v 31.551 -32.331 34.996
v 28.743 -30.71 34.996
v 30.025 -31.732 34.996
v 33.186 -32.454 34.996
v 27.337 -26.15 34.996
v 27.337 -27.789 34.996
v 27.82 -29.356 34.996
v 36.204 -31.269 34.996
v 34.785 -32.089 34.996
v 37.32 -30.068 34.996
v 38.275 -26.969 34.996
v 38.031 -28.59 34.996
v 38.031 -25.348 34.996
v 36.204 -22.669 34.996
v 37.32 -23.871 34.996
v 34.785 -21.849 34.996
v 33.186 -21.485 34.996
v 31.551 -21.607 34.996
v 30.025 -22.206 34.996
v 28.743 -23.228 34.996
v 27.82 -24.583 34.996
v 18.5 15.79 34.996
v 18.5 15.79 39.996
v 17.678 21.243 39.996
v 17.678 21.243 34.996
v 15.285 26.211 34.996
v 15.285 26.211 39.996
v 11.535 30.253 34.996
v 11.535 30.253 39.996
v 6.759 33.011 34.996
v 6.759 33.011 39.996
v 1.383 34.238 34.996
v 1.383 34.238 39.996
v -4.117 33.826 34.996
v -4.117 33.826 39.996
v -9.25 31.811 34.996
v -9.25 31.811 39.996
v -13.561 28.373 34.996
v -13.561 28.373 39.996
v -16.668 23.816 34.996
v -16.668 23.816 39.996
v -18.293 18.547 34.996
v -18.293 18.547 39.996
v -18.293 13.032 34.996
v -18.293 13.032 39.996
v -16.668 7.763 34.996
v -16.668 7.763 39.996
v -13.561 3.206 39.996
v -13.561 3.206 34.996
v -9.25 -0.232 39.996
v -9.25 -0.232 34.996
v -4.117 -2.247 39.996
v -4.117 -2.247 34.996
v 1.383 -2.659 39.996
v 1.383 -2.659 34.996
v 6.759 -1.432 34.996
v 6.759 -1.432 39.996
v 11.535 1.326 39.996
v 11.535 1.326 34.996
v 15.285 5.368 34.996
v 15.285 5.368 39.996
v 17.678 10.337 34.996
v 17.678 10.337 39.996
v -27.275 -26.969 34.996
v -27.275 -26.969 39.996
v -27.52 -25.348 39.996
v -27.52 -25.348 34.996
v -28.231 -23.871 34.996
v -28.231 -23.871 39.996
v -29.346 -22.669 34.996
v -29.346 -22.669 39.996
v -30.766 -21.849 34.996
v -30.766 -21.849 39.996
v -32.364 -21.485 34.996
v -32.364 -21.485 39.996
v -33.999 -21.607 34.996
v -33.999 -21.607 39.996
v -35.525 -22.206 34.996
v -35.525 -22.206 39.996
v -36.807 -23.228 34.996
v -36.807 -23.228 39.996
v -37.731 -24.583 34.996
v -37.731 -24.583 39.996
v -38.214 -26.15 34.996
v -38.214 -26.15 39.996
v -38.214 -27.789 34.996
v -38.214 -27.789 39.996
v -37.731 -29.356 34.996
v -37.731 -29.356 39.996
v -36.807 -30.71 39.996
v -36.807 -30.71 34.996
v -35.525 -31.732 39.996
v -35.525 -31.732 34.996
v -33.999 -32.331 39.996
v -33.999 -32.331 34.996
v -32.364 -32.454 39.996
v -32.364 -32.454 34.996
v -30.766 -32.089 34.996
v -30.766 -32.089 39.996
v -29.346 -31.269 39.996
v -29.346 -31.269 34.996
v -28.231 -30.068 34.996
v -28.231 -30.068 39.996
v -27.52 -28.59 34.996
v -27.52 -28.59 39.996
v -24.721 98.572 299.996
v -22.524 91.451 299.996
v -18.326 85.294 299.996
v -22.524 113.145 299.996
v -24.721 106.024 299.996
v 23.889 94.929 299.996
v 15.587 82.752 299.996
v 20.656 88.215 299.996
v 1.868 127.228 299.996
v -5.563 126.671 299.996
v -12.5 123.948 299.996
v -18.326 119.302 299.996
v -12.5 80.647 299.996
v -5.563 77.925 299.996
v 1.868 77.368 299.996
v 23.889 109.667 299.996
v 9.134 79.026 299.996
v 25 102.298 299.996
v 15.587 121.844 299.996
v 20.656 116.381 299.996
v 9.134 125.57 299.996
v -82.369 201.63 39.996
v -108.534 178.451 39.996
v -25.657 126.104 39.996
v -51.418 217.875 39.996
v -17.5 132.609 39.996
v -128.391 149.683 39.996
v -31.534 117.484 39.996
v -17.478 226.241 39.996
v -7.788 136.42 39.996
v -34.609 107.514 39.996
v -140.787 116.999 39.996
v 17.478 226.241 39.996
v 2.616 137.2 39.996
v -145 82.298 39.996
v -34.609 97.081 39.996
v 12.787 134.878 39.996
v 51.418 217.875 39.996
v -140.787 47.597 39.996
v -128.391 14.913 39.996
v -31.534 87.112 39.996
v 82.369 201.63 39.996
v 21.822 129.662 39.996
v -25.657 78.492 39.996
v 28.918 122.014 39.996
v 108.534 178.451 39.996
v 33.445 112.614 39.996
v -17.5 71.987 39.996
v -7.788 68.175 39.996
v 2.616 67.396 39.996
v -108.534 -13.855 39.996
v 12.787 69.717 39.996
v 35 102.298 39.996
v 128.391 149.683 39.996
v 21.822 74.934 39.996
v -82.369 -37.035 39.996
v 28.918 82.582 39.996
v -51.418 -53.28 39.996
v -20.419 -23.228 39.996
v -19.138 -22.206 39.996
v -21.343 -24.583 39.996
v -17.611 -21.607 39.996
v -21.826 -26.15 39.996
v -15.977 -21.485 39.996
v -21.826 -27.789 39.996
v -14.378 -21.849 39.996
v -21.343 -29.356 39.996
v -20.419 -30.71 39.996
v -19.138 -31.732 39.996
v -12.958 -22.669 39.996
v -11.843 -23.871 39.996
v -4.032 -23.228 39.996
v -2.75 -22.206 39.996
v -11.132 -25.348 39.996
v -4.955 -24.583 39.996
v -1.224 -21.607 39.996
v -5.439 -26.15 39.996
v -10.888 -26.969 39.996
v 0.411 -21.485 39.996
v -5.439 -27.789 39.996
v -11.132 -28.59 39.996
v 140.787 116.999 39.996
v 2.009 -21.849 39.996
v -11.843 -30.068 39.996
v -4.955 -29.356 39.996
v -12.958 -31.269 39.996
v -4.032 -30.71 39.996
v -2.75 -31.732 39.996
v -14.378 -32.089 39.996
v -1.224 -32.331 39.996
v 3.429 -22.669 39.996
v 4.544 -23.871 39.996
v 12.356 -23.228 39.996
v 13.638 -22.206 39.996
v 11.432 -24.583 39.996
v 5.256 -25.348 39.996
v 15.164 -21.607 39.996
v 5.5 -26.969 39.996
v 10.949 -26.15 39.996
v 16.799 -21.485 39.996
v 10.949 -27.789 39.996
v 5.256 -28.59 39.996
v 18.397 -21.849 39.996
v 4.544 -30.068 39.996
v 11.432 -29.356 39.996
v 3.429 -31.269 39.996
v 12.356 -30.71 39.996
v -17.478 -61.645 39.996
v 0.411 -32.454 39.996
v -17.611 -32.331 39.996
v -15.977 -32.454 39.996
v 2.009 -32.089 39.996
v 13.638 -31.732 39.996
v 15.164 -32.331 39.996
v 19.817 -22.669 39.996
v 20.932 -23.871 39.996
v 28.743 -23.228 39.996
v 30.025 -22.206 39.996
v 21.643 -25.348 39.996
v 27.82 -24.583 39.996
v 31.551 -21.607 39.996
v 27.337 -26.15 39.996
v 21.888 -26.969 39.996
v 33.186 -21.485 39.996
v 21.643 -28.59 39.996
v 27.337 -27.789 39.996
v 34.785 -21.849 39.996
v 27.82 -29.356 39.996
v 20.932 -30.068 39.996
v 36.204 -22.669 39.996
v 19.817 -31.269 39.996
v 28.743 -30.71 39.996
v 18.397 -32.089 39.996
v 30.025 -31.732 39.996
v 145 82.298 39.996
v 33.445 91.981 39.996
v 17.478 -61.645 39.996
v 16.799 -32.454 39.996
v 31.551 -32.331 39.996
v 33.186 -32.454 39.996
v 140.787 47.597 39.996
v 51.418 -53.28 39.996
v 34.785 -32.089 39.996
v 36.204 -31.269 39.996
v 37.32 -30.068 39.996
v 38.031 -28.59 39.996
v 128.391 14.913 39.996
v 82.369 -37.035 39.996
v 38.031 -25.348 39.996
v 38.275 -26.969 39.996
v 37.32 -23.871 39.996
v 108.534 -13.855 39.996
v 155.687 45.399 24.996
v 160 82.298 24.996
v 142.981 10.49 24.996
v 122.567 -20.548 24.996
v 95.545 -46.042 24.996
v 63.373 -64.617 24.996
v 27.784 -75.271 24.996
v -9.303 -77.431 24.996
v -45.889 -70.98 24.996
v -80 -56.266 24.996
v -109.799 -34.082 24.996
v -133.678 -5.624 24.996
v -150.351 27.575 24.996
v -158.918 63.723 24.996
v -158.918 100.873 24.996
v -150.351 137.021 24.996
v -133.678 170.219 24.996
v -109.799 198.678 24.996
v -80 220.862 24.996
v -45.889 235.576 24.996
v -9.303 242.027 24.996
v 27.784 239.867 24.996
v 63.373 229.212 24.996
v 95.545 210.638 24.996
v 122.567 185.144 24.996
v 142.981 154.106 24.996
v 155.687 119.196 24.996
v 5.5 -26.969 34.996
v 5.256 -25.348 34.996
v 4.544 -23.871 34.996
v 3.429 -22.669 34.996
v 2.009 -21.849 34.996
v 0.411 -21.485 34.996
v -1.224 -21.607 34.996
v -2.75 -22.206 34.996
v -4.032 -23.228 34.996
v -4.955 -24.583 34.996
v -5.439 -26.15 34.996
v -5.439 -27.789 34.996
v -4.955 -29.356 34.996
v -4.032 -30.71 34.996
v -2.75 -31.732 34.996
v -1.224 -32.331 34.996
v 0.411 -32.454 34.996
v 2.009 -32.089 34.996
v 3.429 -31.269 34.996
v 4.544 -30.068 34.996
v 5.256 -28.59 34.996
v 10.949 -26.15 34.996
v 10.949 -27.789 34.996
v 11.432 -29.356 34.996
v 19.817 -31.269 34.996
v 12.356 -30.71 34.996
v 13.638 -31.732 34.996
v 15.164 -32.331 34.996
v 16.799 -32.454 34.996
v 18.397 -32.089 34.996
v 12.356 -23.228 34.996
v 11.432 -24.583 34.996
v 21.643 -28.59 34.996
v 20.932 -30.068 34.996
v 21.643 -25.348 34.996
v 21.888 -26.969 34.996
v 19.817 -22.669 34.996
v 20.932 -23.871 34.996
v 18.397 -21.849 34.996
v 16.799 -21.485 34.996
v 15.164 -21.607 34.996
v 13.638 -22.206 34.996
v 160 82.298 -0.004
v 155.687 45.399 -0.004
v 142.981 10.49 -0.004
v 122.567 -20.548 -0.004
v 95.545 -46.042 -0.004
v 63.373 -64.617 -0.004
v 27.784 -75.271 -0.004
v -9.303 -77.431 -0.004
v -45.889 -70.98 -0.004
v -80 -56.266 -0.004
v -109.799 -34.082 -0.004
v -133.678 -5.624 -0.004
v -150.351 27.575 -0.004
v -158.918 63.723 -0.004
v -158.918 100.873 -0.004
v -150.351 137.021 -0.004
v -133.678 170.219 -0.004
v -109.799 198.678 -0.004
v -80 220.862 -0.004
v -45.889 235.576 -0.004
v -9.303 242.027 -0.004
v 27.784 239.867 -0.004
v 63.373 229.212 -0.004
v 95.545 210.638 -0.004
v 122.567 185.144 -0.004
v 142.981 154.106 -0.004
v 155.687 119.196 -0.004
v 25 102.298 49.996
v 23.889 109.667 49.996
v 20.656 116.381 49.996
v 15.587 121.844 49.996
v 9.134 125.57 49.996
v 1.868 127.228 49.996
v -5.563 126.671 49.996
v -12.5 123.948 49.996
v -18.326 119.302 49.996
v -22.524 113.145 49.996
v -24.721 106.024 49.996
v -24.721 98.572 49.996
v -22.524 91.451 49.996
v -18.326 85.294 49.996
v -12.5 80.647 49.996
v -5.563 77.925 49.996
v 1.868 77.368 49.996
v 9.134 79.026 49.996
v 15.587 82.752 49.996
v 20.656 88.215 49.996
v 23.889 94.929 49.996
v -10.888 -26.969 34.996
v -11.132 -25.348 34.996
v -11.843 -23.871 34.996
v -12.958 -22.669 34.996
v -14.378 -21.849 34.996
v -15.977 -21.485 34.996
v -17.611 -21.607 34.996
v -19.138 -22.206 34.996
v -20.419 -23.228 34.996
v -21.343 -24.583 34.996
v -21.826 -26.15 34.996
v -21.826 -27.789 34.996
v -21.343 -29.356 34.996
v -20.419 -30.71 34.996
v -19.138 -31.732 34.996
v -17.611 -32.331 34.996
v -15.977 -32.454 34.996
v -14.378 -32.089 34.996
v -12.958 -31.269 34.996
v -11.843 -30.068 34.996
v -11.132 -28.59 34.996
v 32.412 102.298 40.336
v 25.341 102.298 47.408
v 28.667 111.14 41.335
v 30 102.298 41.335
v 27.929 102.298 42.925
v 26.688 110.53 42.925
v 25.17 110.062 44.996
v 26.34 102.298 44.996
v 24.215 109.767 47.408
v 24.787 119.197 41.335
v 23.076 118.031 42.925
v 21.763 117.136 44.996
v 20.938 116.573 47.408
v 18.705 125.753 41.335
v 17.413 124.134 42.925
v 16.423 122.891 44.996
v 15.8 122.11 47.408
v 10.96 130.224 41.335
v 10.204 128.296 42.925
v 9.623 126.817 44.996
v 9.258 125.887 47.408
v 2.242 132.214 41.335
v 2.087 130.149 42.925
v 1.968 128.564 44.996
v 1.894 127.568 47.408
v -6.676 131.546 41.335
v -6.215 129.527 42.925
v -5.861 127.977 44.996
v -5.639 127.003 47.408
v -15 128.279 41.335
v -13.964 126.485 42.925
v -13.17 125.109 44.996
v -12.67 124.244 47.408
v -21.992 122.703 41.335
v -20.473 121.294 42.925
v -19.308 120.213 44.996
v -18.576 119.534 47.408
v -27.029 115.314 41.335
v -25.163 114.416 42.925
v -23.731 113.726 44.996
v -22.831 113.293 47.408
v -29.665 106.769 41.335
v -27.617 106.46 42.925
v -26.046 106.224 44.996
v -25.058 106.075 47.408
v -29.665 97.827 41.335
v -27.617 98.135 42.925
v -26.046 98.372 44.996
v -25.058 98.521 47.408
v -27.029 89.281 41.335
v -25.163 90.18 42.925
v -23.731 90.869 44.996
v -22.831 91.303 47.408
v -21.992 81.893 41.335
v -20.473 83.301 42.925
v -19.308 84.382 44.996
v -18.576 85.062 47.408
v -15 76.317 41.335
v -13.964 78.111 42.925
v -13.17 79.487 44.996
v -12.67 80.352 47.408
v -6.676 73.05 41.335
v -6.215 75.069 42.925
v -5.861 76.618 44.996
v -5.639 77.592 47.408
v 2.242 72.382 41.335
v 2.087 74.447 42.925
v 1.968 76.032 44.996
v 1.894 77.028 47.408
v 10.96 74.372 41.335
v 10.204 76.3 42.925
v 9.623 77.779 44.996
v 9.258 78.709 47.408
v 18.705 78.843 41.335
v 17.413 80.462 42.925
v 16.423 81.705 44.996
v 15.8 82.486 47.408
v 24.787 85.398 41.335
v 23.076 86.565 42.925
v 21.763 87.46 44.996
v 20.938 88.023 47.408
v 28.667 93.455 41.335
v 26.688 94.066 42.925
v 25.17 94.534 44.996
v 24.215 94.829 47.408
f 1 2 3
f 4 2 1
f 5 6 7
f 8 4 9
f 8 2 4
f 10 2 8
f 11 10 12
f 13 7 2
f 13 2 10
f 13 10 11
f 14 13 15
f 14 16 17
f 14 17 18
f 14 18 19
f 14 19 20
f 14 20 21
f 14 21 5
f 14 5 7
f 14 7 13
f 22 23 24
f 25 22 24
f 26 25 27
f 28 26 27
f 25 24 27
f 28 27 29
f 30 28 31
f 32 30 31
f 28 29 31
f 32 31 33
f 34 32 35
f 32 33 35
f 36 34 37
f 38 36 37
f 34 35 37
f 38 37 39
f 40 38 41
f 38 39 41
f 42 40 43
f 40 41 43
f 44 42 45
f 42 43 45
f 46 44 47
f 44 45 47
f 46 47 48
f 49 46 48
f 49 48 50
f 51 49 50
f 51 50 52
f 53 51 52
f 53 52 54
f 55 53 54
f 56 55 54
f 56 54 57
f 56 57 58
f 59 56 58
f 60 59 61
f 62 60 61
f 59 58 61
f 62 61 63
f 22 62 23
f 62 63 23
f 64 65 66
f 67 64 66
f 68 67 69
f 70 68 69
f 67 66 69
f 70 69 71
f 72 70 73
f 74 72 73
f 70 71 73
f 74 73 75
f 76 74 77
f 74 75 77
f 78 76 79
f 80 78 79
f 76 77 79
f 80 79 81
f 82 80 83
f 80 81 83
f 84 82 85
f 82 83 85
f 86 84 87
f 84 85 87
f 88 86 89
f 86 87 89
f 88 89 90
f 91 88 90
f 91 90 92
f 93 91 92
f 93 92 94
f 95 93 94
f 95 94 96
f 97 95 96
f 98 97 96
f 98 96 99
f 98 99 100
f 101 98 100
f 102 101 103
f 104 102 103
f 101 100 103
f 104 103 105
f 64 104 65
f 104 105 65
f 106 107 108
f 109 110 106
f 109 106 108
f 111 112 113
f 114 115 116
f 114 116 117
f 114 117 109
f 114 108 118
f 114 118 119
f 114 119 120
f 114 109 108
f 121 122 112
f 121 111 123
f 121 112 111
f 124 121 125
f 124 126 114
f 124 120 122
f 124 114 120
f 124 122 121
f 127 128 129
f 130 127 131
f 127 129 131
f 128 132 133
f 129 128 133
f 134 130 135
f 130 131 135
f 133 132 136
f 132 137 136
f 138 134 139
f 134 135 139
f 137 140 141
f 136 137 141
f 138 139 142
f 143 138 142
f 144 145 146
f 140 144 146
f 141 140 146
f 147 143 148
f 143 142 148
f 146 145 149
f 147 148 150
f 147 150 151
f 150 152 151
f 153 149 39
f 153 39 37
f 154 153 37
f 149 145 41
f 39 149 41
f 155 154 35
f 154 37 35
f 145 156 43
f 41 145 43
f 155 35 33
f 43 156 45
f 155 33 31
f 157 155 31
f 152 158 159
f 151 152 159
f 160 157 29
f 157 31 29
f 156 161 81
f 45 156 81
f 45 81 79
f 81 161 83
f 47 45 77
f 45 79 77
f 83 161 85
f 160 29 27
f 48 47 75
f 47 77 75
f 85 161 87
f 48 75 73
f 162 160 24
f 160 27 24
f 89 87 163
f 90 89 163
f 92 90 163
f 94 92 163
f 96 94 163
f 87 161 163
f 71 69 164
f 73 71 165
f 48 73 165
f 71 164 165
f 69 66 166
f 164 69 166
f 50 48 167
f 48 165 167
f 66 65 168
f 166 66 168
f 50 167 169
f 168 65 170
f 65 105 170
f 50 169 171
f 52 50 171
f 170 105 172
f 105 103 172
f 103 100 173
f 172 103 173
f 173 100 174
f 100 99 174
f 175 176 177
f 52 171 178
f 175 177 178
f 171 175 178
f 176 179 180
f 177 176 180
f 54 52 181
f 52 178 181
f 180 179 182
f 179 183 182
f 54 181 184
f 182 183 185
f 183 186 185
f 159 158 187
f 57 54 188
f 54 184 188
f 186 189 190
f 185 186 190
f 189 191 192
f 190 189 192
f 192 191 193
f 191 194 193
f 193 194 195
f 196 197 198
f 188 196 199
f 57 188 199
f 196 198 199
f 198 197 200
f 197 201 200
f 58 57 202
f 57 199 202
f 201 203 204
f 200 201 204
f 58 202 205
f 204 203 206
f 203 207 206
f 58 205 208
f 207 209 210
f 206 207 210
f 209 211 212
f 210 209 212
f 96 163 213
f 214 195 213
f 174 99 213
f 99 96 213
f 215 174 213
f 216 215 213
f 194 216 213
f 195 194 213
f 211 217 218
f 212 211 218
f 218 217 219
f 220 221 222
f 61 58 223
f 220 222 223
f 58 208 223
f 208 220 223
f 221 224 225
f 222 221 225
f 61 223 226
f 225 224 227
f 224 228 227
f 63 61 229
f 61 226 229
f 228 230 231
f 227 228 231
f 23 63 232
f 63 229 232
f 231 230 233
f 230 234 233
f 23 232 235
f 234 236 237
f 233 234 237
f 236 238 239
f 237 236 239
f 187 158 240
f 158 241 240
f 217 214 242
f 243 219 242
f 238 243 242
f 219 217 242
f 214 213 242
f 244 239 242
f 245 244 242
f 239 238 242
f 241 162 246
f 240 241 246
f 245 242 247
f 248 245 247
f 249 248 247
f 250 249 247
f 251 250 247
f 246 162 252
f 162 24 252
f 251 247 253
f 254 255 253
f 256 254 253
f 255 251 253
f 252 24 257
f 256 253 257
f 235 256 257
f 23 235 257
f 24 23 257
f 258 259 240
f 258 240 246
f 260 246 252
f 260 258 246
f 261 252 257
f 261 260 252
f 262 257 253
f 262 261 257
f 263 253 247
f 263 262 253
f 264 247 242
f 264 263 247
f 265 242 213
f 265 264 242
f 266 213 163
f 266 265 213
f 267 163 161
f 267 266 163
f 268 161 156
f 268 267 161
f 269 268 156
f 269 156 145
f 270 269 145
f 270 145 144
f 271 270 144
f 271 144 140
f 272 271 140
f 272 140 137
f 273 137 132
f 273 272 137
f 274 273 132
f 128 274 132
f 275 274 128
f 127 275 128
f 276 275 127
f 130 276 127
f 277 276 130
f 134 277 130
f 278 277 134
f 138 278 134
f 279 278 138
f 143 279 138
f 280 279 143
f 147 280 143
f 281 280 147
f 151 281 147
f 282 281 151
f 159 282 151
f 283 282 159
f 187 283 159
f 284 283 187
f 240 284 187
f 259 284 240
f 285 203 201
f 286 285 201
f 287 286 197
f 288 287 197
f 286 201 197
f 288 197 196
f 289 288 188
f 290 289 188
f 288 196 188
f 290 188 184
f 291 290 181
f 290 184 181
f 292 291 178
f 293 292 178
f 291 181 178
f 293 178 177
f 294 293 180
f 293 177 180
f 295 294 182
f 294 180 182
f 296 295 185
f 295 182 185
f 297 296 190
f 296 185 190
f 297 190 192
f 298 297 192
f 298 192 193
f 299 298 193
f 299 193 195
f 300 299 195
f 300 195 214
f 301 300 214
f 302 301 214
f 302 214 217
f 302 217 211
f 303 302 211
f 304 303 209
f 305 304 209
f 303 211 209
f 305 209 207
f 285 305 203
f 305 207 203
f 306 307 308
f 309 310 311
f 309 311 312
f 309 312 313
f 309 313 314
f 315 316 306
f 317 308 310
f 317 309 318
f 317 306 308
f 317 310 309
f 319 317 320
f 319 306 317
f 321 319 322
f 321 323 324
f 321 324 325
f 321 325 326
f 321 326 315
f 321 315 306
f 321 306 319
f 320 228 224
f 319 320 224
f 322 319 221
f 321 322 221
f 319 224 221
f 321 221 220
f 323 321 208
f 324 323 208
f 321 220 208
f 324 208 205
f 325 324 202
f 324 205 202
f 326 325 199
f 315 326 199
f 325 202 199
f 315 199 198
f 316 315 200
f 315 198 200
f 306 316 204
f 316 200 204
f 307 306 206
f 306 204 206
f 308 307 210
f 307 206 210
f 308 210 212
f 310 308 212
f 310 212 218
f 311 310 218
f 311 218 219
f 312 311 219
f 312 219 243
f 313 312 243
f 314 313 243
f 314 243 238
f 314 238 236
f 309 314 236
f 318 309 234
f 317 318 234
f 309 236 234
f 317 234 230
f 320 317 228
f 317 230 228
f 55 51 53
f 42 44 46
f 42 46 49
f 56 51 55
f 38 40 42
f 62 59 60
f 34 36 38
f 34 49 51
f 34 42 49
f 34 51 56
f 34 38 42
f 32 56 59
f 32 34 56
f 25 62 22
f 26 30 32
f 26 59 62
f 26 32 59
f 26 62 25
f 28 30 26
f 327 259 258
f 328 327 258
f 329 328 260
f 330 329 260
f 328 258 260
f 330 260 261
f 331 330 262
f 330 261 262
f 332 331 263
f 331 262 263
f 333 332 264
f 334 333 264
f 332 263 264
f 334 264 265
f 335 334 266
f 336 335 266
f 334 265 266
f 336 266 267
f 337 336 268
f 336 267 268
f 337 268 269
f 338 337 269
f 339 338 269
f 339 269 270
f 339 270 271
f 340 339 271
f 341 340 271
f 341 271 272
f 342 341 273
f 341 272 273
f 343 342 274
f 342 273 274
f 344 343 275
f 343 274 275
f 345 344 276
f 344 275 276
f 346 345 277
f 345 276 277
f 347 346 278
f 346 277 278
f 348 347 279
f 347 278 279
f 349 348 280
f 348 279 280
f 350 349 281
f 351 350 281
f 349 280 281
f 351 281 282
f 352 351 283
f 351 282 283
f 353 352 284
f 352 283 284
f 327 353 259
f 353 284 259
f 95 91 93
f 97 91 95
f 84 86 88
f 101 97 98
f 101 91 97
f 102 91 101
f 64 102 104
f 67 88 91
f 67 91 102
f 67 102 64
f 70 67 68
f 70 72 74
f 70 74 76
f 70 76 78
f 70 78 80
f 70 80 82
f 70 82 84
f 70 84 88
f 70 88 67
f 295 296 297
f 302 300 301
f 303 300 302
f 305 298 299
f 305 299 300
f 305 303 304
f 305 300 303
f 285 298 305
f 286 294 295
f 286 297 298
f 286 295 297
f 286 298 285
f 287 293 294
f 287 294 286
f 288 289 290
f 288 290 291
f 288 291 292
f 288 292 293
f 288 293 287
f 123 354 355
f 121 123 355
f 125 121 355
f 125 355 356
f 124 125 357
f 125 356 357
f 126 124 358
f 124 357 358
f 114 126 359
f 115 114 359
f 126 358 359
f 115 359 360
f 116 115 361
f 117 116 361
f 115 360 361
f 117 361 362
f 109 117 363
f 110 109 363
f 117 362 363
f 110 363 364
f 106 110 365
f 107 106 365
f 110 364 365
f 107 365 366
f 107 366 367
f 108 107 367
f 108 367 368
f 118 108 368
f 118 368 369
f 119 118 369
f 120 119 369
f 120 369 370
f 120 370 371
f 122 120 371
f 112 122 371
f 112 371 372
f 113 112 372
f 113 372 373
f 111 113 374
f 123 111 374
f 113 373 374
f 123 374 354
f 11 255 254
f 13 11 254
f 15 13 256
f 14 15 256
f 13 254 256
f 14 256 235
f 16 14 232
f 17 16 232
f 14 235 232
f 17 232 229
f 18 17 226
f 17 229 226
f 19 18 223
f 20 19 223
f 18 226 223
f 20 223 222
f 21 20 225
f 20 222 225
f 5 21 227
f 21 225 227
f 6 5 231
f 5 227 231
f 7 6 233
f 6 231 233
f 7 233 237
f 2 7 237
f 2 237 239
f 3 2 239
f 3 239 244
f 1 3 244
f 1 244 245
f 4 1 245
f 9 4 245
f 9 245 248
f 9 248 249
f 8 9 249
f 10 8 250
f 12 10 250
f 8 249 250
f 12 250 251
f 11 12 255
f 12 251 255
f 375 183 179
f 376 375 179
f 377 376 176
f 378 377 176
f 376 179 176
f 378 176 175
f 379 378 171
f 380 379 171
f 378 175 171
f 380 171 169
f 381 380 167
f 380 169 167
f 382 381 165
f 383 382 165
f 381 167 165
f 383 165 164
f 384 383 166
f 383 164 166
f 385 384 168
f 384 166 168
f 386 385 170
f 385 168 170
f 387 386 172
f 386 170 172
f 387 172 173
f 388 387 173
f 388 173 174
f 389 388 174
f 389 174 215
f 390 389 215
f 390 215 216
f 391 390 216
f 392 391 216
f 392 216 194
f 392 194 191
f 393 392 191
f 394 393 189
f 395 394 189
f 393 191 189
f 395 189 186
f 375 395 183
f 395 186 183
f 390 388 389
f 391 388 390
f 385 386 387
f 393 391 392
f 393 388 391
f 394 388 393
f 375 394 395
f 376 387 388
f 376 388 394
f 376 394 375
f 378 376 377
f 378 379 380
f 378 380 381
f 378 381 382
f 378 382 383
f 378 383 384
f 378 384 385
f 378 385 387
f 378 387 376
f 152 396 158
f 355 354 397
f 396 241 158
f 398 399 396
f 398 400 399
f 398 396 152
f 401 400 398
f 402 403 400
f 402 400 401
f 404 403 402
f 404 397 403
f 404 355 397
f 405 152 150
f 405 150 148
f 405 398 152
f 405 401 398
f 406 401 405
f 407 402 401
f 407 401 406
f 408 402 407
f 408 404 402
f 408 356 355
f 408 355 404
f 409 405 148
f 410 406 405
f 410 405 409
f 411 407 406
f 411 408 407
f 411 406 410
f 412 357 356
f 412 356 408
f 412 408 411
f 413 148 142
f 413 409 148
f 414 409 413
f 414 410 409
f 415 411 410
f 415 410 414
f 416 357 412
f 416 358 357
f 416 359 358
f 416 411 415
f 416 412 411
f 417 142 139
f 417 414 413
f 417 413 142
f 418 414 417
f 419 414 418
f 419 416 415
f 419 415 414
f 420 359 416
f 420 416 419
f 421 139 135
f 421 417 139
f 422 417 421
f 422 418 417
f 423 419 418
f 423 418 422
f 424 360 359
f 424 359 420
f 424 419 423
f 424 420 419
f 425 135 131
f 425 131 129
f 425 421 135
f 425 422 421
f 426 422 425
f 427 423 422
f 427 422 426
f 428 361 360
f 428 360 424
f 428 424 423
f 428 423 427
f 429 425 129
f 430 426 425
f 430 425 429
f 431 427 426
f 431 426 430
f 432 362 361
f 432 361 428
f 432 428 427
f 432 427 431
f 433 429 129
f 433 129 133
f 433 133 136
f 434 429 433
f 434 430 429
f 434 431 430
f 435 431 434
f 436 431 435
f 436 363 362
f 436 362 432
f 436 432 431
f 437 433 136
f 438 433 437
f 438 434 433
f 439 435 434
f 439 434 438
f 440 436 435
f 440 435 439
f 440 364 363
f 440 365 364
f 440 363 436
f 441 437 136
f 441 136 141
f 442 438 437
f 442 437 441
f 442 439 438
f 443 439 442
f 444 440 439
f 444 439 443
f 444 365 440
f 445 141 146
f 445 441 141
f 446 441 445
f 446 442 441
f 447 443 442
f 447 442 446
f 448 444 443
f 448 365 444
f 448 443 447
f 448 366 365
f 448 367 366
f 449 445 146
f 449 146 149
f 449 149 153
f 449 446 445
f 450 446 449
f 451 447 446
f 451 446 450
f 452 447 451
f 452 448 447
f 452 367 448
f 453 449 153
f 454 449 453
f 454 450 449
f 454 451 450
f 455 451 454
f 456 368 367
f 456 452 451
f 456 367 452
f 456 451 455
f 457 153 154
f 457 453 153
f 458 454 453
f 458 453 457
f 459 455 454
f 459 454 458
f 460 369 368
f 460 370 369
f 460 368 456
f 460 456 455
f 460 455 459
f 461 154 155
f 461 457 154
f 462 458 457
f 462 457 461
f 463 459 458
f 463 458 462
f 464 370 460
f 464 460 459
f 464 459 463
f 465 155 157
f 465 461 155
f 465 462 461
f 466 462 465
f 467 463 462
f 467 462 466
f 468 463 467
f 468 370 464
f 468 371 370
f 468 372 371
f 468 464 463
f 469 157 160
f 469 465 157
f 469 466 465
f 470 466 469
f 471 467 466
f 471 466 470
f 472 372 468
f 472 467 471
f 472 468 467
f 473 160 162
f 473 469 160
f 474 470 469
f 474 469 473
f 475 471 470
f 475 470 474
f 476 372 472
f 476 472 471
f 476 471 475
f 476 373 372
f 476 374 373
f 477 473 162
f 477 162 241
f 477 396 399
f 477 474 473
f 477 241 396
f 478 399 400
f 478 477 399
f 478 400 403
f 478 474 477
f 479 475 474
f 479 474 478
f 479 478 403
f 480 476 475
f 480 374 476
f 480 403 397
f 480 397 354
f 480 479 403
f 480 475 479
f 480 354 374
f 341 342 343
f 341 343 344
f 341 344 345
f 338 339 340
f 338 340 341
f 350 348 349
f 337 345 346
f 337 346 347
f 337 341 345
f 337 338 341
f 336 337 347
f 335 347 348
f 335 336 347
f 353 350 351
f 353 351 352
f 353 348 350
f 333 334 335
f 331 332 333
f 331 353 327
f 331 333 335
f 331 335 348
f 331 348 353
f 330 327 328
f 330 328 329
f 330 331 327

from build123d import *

# Parameters (mm, degrees)
SKETCH034_R     = 160
PAD021_DEPTH    = 40
SKETCH035_R     = 25
PAD022_DEPTH    = 260
FILLET004_R     = 10
SKETCH036_R     = 18.5
SKETCH036_R_2   = 5.5
POCKET004_DEPTH = 5
SKETCH037_R     = 17.5
SKETCH037_R_2   = 5
PAD023_DEPTH    = 10
FILLET005_R     = 1
PAD024_DEPTH    = 5
FILLET006_R     = 0.5
FILLET007_R     = 1.5
FILLET008_R     = 0.5
CHAMFER001_SIZE = 15
SKETCH055_R     = 5
POCKET007_DEPTH = 10
SKETCH056_R     = 17.5
POCKET008_DEPTH = 15


with BuildPart() as part:
    # Sketch034 (on Face1 of CopyPad021) → Pad021 (new body)
    with BuildSketch(Plane(origin=(0, 0, -559.544271), x_dir=(1, 0, 0), z_dir=(0, 0, -1))):
        with Locations((0, -82.297836)):
            Circle(SKETCH034_R)
    extrude(amount=PAD021_DEPTH)

    # Sketch035 (on Face2 of Pad021) → Pad022 (join)
    with BuildSketch(Plane.XY.offset(-559.544271)):
        with Locations((0, 102.297836)):
            Circle(SKETCH035_R)
    extrude(amount=PAD022_DEPTH)

    # Fillet004
    fillet004_edges = [part.edges().sort_by_distance(p)[0] for p in [
        (-25, 102.297836, -559.544271),
    ]]
    fillet(fillet004_edges, radius=FILLET004_R)

    # Sketch036 (on Face1 of Fillet004) → Pocket004 (cut)
    with BuildSketch(Plane.XY.offset(-559.544271)):
        with Locations((0, 15.789559)):
            Circle(SKETCH036_R)
        with Locations((-32.775259, -26.969265)):
            Circle(SKETCH036_R_2)
        with Locations((-16.38763, -26.969265)):
            Circle(SKETCH036_R_2)
        with Locations((0, -26.969265)):
            Circle(SKETCH036_R_2)
        with Locations((16.38763, -26.969265)):
            Circle(SKETCH036_R_2)
        with Locations((32.775259, -26.969265)):
            Circle(SKETCH036_R_2)
    extrude(amount=-POCKET004_DEPTH, mode=Mode.SUBTRACT)

    # Sketch037 (on Face14 of Pocket004) → Pad023 (join)
    with BuildSketch(Plane.XY.offset(-564.544271)):
        with Locations((0, 15.789559)):
            Circle(SKETCH037_R)
        with Locations((-32.775259, -26.969265)):
            Circle(SKETCH037_R_2)
        with Locations((-16.38763, -26.969265)):
            Circle(SKETCH037_R_2)
        with Locations((0, -26.969265)):
            Circle(SKETCH037_R_2)
        with Locations((16.38763, -26.969265)):
            Circle(SKETCH037_R_2)
        with Locations((32.775259, -26.969265)):
            Circle(SKETCH037_R_2)
    extrude(amount=PAD023_DEPTH)

    # Fillet005
    fillet005_edges = [part.edges().sort_by_distance(p)[0] for p in [
        (-5, -26.969265, -554.544271),
        (11.38763, -26.969265, -554.544271),
        (27.775259, -26.969265, -554.544271),
        (-21.38763, -26.969265, -554.544271),
        (-37.775259, -26.969265, -554.544271),
    ]]
    fillet(fillet005_edges, radius=FILLET005_R)

    # Sketch038 (on Face29 of Fillet005) → Pad024 (join)
    with BuildSketch(Plane.XY.offset(-554.544271)):
        with BuildLine():
            ThreePointArc((3.946719, 28.587051), (0, 32.53377), (-3.946719, 28.587051))
            Line((-3.946719, 28.587051), (-3.946719, 2.992067))
            ThreePointArc((-3.946719, 2.992067), (0, -0.954652), (3.946719, 2.992067))
            Line((3.946719, 28.587051), (3.946719, 2.992067))
        make_face()
    extrude(amount=PAD024_DEPTH)

    # Fillet006
    fillet006_edges = [part.edges().sort_by_distance(p)[0] for p in [
        (-3.946719, 15.789559, -554.544271),
    ]]
    fillet(fillet006_edges, radius=FILLET006_R)

    # Fillet007
    fillet007_edges = [part.edges().sort_by_distance(p)[0] for p in [
        (-3.946719, 15.789559, -549.544271),
    ]]
    fillet(fillet007_edges, radius=FILLET007_R)

    # Fillet008
    fillet008_edges = [part.edges().sort_by_distance(p)[0] for p in [
        (-17.5, 15.789559, -554.544271),
    ]]
    fillet(fillet008_edges, radius=FILLET008_R)

    # Chamfer001
    chamfer001_edges = [part.edges().sort_by_distance(p)[0] for p in [
        (-160, 82.297836, -559.544271),
    ]]
    chamfer(chamfer001_edges, length=CHAMFER001_SIZE)

    # Sketch055 (on Face36 of Chamfer001) → Pocket007 (cut)
    with BuildSketch(Plane.XY.offset(-554.544271)):
        with Locations((-32.775259, -26.969265)):
            Circle(SKETCH055_R)
        with Locations((-16.38763, -26.969265)):
            Circle(SKETCH055_R)
        with Locations((0, -26.969265)):
            Circle(SKETCH055_R)
        with Locations((16.38763, -26.969265)):
            Circle(SKETCH055_R)
        with Locations((32.775259, -26.969265)):
            Circle(SKETCH055_R)
    extrude(amount=-POCKET007_DEPTH, mode=Mode.SUBTRACT)

    # Sketch056 (on Face30 of Pocket007) → Pocket008 (cut)
    with BuildSketch(Plane.XY.offset(-549.544271)):
        with Locations((0, 15.789559)):
            Circle(SKETCH056_R)
    extrude(amount=-POCKET008_DEPTH, mode=Mode.SUBTRACT)


with BuildPart() as part_1:
    # Clone002 placement: moved
    add(part.part.moved(Location((0, 0, 599.54))))


solid = part_1.part
